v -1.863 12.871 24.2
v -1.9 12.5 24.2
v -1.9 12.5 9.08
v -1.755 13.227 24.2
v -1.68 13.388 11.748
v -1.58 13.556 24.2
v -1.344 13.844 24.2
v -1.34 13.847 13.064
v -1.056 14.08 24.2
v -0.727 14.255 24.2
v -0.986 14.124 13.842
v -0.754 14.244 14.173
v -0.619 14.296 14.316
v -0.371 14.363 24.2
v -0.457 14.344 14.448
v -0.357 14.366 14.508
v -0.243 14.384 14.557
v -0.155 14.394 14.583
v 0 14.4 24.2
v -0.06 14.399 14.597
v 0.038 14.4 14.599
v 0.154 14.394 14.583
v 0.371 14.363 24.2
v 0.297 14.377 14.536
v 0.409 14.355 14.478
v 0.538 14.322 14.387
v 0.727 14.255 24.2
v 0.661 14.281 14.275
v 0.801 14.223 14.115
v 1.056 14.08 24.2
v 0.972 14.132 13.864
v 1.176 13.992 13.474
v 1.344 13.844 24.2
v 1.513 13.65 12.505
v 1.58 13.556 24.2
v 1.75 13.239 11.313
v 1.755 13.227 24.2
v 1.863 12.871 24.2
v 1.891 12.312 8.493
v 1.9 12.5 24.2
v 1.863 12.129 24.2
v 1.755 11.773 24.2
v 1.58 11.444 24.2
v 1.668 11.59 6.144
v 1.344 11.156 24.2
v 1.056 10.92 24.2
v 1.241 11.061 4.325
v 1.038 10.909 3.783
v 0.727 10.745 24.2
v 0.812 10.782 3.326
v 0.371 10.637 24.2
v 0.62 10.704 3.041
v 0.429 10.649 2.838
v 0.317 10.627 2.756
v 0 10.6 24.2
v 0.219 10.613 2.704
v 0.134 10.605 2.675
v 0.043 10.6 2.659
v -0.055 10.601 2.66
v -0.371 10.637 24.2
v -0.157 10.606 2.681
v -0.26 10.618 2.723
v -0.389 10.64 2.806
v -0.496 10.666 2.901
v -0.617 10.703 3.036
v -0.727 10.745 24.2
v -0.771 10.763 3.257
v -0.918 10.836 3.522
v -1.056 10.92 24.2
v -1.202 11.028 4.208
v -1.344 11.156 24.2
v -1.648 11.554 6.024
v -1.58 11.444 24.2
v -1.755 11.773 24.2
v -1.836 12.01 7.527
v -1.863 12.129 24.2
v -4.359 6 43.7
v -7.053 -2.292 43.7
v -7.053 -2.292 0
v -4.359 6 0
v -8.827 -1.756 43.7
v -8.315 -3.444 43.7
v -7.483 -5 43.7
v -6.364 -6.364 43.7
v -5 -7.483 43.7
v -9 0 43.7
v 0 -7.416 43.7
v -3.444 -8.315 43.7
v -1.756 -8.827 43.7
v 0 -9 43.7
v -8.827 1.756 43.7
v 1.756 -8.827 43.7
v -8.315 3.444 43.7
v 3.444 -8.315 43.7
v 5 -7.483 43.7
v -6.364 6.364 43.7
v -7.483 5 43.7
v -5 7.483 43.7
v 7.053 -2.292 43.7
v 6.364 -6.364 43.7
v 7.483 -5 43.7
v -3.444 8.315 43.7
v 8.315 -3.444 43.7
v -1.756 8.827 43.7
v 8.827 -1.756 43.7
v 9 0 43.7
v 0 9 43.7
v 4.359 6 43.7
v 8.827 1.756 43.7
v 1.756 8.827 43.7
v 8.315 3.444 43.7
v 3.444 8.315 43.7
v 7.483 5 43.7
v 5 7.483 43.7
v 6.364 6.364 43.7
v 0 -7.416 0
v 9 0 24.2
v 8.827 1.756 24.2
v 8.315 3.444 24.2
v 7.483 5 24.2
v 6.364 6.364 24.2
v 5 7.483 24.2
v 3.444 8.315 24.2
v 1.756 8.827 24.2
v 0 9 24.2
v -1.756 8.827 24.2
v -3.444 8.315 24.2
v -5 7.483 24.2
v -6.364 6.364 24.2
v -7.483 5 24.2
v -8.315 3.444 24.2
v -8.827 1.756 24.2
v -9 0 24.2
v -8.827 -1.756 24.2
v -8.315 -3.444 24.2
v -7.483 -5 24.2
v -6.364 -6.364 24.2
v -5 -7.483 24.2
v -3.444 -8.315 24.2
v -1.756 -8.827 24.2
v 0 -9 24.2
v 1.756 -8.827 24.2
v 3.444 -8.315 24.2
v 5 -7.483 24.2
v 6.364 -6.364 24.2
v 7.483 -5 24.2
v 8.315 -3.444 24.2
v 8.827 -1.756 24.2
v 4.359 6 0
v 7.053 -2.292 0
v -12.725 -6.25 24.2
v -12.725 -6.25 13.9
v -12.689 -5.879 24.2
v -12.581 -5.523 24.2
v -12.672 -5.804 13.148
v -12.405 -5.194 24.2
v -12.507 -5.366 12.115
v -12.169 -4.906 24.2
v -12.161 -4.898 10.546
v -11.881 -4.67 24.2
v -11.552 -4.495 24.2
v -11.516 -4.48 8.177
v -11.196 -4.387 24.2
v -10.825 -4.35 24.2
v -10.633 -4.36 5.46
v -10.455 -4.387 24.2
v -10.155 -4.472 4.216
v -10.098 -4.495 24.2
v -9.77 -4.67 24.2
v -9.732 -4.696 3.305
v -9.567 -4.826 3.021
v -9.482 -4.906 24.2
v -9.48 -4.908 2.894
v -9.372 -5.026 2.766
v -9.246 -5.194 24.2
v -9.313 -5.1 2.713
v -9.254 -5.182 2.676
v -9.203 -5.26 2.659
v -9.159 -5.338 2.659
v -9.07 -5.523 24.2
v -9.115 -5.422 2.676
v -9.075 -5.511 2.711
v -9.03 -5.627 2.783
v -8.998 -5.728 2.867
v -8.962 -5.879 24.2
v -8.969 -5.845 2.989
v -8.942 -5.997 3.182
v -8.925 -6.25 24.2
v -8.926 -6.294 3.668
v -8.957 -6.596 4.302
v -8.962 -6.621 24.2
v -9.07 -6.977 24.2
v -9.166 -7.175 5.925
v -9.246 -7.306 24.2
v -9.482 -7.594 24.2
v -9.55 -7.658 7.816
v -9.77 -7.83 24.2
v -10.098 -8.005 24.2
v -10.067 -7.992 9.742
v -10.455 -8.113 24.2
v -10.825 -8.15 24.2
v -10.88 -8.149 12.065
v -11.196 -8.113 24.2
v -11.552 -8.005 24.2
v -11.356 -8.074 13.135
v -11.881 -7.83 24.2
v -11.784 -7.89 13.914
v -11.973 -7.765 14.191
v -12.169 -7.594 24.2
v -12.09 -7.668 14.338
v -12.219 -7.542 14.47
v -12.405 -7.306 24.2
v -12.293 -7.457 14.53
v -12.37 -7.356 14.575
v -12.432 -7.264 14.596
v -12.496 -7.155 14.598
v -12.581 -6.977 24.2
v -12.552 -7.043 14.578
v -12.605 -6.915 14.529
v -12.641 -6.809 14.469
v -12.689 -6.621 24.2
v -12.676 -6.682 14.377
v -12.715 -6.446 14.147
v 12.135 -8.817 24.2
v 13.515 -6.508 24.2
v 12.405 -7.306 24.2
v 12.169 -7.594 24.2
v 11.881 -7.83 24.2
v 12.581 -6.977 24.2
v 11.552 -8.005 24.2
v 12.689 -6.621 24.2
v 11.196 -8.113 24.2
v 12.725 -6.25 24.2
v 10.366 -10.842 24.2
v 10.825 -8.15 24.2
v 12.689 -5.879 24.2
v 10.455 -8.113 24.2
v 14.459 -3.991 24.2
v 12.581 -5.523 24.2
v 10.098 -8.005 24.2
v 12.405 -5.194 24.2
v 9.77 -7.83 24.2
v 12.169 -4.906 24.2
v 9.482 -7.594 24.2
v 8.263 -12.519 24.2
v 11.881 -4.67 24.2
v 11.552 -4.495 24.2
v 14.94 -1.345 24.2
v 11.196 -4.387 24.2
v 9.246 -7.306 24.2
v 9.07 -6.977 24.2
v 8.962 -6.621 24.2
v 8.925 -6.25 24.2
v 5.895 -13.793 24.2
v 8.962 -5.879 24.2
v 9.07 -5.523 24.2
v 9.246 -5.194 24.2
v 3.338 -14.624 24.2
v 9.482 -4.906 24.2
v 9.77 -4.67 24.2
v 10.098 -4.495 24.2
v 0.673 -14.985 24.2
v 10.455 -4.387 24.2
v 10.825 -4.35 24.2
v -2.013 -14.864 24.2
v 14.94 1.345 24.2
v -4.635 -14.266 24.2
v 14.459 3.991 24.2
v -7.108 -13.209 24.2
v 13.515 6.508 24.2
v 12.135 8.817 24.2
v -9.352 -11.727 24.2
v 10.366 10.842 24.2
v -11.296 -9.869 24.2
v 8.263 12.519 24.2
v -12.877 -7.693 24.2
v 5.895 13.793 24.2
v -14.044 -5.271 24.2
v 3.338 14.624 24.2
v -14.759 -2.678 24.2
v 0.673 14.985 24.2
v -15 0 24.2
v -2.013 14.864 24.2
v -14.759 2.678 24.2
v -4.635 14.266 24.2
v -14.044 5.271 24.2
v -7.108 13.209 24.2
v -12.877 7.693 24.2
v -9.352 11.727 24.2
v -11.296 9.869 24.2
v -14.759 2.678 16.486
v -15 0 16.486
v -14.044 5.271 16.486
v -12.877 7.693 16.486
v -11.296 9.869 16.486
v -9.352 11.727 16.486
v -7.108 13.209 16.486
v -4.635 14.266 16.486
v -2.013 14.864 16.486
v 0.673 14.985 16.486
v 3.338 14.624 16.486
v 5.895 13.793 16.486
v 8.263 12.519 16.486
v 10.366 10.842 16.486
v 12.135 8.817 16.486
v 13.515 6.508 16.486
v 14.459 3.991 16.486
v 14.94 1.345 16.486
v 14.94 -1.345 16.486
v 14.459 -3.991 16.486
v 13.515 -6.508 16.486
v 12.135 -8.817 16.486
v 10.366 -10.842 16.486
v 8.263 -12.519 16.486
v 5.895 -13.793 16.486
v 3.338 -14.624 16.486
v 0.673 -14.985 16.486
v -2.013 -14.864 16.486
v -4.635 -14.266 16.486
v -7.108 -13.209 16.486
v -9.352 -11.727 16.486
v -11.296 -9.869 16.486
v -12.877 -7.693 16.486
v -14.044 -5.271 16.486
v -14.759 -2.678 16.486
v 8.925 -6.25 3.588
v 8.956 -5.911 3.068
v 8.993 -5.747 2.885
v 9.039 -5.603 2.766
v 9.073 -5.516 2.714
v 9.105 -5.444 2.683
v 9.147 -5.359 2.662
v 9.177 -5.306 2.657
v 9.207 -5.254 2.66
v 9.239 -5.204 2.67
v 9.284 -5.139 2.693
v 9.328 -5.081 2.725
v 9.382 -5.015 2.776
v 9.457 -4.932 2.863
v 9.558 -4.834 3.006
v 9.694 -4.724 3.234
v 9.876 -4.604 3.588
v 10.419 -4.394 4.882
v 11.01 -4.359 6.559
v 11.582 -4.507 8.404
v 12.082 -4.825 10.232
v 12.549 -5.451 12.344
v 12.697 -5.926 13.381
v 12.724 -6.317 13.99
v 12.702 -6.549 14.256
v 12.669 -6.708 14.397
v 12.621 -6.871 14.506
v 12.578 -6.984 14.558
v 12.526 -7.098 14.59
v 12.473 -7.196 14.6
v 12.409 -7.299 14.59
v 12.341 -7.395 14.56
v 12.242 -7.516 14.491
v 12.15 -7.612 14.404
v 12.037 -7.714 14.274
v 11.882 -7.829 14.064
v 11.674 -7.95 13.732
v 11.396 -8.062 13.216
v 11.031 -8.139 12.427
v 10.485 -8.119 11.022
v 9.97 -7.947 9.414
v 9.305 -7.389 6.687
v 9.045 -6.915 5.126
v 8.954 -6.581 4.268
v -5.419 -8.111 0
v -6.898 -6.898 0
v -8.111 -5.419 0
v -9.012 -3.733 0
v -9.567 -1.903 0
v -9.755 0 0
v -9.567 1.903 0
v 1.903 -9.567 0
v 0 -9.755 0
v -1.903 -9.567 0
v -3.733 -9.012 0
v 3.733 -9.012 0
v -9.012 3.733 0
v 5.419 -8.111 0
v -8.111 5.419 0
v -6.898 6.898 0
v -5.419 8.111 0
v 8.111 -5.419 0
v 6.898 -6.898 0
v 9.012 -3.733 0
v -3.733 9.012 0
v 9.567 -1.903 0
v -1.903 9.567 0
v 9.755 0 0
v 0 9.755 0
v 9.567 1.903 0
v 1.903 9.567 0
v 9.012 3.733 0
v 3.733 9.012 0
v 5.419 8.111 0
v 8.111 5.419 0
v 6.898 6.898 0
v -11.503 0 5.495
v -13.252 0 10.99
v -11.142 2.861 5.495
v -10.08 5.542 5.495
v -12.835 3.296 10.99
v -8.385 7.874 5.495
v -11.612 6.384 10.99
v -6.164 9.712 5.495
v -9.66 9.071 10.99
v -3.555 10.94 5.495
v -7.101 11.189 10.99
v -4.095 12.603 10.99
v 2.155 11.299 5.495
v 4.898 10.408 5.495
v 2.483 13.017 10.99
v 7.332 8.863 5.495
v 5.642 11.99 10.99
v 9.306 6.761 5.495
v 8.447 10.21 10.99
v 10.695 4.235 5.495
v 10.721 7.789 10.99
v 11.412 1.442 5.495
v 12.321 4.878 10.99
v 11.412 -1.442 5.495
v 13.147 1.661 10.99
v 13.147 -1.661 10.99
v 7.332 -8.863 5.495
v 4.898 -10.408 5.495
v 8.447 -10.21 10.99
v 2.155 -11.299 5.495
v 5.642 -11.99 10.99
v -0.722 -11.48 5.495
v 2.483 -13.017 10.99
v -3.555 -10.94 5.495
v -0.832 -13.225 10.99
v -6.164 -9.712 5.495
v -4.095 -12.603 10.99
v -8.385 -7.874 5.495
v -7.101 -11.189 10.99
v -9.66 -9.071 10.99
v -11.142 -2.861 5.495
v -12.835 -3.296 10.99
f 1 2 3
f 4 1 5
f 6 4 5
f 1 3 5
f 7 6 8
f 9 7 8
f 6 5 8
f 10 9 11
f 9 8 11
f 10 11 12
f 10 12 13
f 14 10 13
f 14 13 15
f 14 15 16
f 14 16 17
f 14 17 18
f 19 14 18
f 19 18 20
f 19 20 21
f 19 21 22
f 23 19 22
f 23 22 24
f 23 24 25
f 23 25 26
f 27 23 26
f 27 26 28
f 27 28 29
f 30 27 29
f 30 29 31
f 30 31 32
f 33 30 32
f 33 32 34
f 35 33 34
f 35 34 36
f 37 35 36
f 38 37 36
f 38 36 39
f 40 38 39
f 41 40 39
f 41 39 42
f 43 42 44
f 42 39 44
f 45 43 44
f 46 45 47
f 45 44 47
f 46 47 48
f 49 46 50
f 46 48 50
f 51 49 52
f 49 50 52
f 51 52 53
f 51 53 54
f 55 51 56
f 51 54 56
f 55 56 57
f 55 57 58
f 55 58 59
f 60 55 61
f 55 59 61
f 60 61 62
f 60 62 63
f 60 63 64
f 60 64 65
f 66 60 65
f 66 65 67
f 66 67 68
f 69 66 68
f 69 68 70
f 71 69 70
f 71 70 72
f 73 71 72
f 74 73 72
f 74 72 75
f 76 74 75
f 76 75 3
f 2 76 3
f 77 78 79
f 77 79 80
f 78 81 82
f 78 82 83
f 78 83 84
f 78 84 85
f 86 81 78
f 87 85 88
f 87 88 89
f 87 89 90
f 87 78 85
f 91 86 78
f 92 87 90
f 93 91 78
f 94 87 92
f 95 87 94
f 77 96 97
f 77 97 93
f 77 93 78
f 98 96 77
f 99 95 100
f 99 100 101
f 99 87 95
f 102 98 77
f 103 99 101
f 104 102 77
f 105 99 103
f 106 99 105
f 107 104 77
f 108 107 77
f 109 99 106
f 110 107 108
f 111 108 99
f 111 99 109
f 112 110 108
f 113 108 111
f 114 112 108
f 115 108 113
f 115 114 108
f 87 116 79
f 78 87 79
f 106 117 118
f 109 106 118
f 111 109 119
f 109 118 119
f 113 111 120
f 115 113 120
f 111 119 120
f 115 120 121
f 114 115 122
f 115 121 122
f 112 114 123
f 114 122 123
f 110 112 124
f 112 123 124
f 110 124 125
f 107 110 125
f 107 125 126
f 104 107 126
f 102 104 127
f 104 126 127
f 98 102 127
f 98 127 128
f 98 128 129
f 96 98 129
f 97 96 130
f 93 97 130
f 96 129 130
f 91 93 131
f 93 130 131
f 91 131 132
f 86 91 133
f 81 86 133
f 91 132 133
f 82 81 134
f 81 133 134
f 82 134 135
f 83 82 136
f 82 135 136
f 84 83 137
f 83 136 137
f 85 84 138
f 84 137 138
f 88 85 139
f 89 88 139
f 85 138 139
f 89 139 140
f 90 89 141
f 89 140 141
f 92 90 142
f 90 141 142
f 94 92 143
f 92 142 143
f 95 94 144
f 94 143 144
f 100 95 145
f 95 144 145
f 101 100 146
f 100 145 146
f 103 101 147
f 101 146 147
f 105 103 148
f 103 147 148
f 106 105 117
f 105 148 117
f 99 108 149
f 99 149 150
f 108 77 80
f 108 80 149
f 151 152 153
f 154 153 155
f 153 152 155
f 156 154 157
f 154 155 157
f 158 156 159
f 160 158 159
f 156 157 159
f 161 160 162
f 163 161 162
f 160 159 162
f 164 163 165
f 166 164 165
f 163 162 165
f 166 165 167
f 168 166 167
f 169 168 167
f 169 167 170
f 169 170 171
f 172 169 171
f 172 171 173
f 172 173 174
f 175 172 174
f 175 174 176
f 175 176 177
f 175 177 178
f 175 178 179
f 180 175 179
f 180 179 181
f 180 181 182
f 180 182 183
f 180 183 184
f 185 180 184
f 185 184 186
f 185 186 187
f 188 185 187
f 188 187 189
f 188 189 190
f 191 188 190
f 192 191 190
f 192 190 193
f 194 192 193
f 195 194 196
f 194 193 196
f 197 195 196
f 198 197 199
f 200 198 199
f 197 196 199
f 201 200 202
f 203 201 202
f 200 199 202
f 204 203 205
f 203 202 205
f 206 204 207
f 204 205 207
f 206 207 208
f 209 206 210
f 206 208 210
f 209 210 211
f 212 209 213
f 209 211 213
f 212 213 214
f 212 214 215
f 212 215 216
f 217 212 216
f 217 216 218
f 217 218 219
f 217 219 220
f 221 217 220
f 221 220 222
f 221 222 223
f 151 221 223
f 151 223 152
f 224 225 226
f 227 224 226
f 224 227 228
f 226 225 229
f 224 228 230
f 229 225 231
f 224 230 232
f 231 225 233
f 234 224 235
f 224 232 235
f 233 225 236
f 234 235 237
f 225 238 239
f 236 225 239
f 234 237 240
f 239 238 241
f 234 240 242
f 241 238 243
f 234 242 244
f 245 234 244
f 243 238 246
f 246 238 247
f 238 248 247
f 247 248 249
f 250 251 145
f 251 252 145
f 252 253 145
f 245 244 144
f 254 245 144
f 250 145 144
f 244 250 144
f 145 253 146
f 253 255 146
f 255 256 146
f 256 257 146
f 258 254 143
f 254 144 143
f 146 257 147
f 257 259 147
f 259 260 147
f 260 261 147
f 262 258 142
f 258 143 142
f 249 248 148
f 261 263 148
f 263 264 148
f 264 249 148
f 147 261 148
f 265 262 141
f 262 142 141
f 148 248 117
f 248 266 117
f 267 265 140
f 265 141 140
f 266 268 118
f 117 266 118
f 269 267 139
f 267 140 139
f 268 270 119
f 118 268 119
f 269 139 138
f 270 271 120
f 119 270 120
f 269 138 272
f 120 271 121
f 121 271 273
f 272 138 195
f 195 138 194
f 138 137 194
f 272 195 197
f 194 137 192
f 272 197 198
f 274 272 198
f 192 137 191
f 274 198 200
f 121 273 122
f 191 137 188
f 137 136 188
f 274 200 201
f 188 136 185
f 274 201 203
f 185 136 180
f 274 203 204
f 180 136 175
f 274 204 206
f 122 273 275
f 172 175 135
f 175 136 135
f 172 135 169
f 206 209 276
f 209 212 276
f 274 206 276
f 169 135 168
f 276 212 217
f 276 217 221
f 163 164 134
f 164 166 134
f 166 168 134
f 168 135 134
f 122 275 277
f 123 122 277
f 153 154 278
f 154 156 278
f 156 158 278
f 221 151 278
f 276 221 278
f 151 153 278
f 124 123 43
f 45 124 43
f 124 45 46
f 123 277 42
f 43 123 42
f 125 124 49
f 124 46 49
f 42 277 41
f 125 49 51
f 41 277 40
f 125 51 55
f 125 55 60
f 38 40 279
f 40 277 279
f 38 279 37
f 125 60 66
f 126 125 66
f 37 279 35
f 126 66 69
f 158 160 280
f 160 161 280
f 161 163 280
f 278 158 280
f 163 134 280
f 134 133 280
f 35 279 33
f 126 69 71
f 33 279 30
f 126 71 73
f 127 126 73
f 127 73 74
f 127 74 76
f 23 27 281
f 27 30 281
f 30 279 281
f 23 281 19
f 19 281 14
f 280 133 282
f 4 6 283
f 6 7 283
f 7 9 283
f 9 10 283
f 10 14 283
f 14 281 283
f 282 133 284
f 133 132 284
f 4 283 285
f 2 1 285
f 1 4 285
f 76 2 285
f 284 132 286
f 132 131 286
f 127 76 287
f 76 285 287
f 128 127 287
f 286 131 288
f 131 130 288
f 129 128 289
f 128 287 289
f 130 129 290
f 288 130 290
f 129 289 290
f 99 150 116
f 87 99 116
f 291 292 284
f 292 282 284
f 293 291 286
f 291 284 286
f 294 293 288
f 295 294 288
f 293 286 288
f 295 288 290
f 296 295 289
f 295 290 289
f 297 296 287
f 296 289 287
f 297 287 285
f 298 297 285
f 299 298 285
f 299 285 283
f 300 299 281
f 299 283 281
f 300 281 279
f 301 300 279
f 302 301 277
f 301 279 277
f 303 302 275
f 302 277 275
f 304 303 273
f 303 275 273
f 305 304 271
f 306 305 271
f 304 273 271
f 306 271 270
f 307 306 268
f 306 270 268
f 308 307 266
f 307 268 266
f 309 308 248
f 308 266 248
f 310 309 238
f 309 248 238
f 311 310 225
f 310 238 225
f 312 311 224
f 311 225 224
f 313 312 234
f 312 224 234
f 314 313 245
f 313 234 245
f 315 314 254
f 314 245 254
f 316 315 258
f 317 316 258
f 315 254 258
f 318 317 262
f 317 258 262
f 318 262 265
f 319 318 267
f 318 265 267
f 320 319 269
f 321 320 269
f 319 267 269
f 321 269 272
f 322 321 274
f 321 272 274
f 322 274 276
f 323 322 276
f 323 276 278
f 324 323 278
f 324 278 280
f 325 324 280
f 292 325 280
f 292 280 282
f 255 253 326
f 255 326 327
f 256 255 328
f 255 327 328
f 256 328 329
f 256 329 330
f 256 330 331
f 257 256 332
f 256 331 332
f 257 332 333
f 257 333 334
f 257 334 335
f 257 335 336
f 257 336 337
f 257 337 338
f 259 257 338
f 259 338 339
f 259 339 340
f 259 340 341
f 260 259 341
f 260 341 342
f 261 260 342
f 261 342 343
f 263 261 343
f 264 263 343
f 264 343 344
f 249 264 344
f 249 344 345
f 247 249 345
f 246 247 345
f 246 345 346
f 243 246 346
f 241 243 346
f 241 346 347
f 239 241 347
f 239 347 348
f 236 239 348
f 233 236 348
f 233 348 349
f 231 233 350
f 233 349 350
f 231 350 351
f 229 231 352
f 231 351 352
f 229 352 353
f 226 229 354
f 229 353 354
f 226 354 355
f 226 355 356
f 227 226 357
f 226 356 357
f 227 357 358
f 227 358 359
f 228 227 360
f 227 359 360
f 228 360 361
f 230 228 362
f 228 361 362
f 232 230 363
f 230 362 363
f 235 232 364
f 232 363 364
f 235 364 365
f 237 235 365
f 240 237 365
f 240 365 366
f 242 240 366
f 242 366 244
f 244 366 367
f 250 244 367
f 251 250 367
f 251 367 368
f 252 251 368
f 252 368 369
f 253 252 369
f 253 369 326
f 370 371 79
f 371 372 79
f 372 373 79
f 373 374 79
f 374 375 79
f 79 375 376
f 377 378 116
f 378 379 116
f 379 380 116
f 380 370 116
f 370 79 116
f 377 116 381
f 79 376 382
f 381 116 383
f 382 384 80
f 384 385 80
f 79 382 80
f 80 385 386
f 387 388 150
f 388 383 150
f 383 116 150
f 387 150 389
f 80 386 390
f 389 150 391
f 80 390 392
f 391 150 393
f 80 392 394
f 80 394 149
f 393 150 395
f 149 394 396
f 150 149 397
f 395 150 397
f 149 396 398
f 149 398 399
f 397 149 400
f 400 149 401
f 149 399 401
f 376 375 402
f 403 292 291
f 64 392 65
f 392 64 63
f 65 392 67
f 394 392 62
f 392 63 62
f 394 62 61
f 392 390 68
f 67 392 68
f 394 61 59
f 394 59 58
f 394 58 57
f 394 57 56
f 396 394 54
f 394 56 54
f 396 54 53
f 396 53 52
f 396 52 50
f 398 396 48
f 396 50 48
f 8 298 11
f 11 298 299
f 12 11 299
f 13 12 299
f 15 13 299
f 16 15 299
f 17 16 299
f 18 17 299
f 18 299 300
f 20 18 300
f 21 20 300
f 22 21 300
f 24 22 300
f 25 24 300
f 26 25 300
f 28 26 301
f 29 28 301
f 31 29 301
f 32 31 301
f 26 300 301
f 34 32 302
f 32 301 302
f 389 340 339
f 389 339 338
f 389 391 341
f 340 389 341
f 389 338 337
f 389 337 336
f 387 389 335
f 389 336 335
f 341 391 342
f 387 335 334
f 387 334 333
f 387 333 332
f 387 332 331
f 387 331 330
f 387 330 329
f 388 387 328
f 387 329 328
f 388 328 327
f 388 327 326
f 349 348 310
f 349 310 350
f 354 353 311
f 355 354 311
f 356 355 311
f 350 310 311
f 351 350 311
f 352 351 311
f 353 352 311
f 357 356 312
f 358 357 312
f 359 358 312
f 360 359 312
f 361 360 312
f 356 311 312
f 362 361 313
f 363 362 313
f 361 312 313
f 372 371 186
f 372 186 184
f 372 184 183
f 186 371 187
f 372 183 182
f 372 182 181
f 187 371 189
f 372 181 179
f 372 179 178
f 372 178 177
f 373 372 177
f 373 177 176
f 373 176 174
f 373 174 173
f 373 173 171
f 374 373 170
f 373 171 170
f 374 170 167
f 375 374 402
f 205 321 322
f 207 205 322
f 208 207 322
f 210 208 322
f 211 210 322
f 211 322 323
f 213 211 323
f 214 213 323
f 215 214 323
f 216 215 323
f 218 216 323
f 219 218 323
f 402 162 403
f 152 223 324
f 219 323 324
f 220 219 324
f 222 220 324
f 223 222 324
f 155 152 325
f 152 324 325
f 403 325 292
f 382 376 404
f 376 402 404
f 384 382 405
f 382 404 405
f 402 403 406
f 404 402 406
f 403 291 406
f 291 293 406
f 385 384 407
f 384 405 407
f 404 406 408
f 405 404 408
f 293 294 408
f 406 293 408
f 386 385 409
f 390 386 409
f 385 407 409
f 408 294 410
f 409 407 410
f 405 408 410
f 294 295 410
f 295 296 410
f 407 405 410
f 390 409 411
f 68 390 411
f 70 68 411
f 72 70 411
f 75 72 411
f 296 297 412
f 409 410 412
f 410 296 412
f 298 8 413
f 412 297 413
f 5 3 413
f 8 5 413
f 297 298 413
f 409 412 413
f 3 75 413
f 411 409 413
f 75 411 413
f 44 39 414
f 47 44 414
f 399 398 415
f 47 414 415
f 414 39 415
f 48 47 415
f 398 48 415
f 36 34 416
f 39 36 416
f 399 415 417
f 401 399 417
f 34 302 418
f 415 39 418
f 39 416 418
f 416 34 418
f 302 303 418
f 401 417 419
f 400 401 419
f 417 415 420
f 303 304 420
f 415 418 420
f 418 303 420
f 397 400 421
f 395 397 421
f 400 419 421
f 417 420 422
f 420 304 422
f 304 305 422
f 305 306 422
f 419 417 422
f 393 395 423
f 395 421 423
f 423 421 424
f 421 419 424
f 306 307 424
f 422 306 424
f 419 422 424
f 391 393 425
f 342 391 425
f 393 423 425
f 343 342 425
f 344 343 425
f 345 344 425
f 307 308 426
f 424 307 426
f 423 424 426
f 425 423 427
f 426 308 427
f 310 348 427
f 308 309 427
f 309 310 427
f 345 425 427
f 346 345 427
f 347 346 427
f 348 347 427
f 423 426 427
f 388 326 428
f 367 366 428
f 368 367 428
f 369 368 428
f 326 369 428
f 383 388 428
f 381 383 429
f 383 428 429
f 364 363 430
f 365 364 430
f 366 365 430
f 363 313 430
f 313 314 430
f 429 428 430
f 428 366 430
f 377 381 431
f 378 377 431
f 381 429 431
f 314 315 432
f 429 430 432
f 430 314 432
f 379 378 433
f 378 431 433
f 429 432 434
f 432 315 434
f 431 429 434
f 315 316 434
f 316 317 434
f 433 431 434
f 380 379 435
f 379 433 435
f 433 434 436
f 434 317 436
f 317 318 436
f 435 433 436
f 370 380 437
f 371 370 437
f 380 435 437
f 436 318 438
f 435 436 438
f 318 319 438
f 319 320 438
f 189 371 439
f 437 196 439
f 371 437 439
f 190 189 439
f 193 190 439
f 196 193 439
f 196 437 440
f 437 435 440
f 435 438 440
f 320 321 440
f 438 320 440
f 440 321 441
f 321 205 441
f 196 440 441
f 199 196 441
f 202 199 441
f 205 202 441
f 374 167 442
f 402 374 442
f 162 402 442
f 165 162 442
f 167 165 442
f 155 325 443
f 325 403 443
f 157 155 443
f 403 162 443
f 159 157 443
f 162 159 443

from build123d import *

# Parameters (mm, degrees)
SKETCH2_R                      = 9
BOSS_EXTRUDE1_DEPTH            = 19.5
CUT_EXTRUDE1_DEPTH             = 49.576640477
F_3_8_3_8_DIAMETER_HOLE1_D     = 3.8
F_3_8_3_8_DIAMETER_HOLE1_DEPTH = 24.2


with BuildPart() as part:
    # Sketch1 → Revolve1 (revolve)
    with BuildSketch(Plane.XZ, mode=Mode.PRIVATE) as revolve1_sk:
        Polygon((15, 24.2), (0, 24.2), (0, 0), (9.754545455, 0), (15, 16.485714286), align=None)
    revolve(revolve1_sk.sketch.rotate(Axis((0, 0, 24.2), (0, 0, -1)), 180), axis=Axis((0, 0, 24.2), (0, 0, -1)))

    # Sketch2 → Boss-Extrude1 (add)
    with BuildSketch(Plane.XY.offset(24.2)):
        Circle(SKETCH2_R)
    extrude(amount=BOSS_EXTRUDE1_DEPTH)

    # Sketch3 → Cut-Extrude1 (cut, through all)
    with BuildSketch(Plane(origin=(0, 0, 0), x_dir=(-1, 0, 0), z_dir=(0, 0, -1))):
        Polygon((0, -7.416407865), (7.053423028, -2.291796068), (4.359255168, 6), (-4.359255168, 6), (-7.053423028, -2.291796068), align=None)
    extrude(amount=-CUT_EXTRUDE1_DEPTH, mode=Mode.SUBTRACT)

    # Ø3.8 (3.8) Diameter Hole1
    with Locations(Plane.XY.offset(24.2)):
        with Locations((10.825317547, -6.25), (-10.825317547, -6.25), (0, 12.5)):
            Hole(F_3_8_3_8_DIAMETER_HOLE1_D / 2, depth=F_3_8_3_8_DIAMETER_HOLE1_DEPTH)


solid = part.part
